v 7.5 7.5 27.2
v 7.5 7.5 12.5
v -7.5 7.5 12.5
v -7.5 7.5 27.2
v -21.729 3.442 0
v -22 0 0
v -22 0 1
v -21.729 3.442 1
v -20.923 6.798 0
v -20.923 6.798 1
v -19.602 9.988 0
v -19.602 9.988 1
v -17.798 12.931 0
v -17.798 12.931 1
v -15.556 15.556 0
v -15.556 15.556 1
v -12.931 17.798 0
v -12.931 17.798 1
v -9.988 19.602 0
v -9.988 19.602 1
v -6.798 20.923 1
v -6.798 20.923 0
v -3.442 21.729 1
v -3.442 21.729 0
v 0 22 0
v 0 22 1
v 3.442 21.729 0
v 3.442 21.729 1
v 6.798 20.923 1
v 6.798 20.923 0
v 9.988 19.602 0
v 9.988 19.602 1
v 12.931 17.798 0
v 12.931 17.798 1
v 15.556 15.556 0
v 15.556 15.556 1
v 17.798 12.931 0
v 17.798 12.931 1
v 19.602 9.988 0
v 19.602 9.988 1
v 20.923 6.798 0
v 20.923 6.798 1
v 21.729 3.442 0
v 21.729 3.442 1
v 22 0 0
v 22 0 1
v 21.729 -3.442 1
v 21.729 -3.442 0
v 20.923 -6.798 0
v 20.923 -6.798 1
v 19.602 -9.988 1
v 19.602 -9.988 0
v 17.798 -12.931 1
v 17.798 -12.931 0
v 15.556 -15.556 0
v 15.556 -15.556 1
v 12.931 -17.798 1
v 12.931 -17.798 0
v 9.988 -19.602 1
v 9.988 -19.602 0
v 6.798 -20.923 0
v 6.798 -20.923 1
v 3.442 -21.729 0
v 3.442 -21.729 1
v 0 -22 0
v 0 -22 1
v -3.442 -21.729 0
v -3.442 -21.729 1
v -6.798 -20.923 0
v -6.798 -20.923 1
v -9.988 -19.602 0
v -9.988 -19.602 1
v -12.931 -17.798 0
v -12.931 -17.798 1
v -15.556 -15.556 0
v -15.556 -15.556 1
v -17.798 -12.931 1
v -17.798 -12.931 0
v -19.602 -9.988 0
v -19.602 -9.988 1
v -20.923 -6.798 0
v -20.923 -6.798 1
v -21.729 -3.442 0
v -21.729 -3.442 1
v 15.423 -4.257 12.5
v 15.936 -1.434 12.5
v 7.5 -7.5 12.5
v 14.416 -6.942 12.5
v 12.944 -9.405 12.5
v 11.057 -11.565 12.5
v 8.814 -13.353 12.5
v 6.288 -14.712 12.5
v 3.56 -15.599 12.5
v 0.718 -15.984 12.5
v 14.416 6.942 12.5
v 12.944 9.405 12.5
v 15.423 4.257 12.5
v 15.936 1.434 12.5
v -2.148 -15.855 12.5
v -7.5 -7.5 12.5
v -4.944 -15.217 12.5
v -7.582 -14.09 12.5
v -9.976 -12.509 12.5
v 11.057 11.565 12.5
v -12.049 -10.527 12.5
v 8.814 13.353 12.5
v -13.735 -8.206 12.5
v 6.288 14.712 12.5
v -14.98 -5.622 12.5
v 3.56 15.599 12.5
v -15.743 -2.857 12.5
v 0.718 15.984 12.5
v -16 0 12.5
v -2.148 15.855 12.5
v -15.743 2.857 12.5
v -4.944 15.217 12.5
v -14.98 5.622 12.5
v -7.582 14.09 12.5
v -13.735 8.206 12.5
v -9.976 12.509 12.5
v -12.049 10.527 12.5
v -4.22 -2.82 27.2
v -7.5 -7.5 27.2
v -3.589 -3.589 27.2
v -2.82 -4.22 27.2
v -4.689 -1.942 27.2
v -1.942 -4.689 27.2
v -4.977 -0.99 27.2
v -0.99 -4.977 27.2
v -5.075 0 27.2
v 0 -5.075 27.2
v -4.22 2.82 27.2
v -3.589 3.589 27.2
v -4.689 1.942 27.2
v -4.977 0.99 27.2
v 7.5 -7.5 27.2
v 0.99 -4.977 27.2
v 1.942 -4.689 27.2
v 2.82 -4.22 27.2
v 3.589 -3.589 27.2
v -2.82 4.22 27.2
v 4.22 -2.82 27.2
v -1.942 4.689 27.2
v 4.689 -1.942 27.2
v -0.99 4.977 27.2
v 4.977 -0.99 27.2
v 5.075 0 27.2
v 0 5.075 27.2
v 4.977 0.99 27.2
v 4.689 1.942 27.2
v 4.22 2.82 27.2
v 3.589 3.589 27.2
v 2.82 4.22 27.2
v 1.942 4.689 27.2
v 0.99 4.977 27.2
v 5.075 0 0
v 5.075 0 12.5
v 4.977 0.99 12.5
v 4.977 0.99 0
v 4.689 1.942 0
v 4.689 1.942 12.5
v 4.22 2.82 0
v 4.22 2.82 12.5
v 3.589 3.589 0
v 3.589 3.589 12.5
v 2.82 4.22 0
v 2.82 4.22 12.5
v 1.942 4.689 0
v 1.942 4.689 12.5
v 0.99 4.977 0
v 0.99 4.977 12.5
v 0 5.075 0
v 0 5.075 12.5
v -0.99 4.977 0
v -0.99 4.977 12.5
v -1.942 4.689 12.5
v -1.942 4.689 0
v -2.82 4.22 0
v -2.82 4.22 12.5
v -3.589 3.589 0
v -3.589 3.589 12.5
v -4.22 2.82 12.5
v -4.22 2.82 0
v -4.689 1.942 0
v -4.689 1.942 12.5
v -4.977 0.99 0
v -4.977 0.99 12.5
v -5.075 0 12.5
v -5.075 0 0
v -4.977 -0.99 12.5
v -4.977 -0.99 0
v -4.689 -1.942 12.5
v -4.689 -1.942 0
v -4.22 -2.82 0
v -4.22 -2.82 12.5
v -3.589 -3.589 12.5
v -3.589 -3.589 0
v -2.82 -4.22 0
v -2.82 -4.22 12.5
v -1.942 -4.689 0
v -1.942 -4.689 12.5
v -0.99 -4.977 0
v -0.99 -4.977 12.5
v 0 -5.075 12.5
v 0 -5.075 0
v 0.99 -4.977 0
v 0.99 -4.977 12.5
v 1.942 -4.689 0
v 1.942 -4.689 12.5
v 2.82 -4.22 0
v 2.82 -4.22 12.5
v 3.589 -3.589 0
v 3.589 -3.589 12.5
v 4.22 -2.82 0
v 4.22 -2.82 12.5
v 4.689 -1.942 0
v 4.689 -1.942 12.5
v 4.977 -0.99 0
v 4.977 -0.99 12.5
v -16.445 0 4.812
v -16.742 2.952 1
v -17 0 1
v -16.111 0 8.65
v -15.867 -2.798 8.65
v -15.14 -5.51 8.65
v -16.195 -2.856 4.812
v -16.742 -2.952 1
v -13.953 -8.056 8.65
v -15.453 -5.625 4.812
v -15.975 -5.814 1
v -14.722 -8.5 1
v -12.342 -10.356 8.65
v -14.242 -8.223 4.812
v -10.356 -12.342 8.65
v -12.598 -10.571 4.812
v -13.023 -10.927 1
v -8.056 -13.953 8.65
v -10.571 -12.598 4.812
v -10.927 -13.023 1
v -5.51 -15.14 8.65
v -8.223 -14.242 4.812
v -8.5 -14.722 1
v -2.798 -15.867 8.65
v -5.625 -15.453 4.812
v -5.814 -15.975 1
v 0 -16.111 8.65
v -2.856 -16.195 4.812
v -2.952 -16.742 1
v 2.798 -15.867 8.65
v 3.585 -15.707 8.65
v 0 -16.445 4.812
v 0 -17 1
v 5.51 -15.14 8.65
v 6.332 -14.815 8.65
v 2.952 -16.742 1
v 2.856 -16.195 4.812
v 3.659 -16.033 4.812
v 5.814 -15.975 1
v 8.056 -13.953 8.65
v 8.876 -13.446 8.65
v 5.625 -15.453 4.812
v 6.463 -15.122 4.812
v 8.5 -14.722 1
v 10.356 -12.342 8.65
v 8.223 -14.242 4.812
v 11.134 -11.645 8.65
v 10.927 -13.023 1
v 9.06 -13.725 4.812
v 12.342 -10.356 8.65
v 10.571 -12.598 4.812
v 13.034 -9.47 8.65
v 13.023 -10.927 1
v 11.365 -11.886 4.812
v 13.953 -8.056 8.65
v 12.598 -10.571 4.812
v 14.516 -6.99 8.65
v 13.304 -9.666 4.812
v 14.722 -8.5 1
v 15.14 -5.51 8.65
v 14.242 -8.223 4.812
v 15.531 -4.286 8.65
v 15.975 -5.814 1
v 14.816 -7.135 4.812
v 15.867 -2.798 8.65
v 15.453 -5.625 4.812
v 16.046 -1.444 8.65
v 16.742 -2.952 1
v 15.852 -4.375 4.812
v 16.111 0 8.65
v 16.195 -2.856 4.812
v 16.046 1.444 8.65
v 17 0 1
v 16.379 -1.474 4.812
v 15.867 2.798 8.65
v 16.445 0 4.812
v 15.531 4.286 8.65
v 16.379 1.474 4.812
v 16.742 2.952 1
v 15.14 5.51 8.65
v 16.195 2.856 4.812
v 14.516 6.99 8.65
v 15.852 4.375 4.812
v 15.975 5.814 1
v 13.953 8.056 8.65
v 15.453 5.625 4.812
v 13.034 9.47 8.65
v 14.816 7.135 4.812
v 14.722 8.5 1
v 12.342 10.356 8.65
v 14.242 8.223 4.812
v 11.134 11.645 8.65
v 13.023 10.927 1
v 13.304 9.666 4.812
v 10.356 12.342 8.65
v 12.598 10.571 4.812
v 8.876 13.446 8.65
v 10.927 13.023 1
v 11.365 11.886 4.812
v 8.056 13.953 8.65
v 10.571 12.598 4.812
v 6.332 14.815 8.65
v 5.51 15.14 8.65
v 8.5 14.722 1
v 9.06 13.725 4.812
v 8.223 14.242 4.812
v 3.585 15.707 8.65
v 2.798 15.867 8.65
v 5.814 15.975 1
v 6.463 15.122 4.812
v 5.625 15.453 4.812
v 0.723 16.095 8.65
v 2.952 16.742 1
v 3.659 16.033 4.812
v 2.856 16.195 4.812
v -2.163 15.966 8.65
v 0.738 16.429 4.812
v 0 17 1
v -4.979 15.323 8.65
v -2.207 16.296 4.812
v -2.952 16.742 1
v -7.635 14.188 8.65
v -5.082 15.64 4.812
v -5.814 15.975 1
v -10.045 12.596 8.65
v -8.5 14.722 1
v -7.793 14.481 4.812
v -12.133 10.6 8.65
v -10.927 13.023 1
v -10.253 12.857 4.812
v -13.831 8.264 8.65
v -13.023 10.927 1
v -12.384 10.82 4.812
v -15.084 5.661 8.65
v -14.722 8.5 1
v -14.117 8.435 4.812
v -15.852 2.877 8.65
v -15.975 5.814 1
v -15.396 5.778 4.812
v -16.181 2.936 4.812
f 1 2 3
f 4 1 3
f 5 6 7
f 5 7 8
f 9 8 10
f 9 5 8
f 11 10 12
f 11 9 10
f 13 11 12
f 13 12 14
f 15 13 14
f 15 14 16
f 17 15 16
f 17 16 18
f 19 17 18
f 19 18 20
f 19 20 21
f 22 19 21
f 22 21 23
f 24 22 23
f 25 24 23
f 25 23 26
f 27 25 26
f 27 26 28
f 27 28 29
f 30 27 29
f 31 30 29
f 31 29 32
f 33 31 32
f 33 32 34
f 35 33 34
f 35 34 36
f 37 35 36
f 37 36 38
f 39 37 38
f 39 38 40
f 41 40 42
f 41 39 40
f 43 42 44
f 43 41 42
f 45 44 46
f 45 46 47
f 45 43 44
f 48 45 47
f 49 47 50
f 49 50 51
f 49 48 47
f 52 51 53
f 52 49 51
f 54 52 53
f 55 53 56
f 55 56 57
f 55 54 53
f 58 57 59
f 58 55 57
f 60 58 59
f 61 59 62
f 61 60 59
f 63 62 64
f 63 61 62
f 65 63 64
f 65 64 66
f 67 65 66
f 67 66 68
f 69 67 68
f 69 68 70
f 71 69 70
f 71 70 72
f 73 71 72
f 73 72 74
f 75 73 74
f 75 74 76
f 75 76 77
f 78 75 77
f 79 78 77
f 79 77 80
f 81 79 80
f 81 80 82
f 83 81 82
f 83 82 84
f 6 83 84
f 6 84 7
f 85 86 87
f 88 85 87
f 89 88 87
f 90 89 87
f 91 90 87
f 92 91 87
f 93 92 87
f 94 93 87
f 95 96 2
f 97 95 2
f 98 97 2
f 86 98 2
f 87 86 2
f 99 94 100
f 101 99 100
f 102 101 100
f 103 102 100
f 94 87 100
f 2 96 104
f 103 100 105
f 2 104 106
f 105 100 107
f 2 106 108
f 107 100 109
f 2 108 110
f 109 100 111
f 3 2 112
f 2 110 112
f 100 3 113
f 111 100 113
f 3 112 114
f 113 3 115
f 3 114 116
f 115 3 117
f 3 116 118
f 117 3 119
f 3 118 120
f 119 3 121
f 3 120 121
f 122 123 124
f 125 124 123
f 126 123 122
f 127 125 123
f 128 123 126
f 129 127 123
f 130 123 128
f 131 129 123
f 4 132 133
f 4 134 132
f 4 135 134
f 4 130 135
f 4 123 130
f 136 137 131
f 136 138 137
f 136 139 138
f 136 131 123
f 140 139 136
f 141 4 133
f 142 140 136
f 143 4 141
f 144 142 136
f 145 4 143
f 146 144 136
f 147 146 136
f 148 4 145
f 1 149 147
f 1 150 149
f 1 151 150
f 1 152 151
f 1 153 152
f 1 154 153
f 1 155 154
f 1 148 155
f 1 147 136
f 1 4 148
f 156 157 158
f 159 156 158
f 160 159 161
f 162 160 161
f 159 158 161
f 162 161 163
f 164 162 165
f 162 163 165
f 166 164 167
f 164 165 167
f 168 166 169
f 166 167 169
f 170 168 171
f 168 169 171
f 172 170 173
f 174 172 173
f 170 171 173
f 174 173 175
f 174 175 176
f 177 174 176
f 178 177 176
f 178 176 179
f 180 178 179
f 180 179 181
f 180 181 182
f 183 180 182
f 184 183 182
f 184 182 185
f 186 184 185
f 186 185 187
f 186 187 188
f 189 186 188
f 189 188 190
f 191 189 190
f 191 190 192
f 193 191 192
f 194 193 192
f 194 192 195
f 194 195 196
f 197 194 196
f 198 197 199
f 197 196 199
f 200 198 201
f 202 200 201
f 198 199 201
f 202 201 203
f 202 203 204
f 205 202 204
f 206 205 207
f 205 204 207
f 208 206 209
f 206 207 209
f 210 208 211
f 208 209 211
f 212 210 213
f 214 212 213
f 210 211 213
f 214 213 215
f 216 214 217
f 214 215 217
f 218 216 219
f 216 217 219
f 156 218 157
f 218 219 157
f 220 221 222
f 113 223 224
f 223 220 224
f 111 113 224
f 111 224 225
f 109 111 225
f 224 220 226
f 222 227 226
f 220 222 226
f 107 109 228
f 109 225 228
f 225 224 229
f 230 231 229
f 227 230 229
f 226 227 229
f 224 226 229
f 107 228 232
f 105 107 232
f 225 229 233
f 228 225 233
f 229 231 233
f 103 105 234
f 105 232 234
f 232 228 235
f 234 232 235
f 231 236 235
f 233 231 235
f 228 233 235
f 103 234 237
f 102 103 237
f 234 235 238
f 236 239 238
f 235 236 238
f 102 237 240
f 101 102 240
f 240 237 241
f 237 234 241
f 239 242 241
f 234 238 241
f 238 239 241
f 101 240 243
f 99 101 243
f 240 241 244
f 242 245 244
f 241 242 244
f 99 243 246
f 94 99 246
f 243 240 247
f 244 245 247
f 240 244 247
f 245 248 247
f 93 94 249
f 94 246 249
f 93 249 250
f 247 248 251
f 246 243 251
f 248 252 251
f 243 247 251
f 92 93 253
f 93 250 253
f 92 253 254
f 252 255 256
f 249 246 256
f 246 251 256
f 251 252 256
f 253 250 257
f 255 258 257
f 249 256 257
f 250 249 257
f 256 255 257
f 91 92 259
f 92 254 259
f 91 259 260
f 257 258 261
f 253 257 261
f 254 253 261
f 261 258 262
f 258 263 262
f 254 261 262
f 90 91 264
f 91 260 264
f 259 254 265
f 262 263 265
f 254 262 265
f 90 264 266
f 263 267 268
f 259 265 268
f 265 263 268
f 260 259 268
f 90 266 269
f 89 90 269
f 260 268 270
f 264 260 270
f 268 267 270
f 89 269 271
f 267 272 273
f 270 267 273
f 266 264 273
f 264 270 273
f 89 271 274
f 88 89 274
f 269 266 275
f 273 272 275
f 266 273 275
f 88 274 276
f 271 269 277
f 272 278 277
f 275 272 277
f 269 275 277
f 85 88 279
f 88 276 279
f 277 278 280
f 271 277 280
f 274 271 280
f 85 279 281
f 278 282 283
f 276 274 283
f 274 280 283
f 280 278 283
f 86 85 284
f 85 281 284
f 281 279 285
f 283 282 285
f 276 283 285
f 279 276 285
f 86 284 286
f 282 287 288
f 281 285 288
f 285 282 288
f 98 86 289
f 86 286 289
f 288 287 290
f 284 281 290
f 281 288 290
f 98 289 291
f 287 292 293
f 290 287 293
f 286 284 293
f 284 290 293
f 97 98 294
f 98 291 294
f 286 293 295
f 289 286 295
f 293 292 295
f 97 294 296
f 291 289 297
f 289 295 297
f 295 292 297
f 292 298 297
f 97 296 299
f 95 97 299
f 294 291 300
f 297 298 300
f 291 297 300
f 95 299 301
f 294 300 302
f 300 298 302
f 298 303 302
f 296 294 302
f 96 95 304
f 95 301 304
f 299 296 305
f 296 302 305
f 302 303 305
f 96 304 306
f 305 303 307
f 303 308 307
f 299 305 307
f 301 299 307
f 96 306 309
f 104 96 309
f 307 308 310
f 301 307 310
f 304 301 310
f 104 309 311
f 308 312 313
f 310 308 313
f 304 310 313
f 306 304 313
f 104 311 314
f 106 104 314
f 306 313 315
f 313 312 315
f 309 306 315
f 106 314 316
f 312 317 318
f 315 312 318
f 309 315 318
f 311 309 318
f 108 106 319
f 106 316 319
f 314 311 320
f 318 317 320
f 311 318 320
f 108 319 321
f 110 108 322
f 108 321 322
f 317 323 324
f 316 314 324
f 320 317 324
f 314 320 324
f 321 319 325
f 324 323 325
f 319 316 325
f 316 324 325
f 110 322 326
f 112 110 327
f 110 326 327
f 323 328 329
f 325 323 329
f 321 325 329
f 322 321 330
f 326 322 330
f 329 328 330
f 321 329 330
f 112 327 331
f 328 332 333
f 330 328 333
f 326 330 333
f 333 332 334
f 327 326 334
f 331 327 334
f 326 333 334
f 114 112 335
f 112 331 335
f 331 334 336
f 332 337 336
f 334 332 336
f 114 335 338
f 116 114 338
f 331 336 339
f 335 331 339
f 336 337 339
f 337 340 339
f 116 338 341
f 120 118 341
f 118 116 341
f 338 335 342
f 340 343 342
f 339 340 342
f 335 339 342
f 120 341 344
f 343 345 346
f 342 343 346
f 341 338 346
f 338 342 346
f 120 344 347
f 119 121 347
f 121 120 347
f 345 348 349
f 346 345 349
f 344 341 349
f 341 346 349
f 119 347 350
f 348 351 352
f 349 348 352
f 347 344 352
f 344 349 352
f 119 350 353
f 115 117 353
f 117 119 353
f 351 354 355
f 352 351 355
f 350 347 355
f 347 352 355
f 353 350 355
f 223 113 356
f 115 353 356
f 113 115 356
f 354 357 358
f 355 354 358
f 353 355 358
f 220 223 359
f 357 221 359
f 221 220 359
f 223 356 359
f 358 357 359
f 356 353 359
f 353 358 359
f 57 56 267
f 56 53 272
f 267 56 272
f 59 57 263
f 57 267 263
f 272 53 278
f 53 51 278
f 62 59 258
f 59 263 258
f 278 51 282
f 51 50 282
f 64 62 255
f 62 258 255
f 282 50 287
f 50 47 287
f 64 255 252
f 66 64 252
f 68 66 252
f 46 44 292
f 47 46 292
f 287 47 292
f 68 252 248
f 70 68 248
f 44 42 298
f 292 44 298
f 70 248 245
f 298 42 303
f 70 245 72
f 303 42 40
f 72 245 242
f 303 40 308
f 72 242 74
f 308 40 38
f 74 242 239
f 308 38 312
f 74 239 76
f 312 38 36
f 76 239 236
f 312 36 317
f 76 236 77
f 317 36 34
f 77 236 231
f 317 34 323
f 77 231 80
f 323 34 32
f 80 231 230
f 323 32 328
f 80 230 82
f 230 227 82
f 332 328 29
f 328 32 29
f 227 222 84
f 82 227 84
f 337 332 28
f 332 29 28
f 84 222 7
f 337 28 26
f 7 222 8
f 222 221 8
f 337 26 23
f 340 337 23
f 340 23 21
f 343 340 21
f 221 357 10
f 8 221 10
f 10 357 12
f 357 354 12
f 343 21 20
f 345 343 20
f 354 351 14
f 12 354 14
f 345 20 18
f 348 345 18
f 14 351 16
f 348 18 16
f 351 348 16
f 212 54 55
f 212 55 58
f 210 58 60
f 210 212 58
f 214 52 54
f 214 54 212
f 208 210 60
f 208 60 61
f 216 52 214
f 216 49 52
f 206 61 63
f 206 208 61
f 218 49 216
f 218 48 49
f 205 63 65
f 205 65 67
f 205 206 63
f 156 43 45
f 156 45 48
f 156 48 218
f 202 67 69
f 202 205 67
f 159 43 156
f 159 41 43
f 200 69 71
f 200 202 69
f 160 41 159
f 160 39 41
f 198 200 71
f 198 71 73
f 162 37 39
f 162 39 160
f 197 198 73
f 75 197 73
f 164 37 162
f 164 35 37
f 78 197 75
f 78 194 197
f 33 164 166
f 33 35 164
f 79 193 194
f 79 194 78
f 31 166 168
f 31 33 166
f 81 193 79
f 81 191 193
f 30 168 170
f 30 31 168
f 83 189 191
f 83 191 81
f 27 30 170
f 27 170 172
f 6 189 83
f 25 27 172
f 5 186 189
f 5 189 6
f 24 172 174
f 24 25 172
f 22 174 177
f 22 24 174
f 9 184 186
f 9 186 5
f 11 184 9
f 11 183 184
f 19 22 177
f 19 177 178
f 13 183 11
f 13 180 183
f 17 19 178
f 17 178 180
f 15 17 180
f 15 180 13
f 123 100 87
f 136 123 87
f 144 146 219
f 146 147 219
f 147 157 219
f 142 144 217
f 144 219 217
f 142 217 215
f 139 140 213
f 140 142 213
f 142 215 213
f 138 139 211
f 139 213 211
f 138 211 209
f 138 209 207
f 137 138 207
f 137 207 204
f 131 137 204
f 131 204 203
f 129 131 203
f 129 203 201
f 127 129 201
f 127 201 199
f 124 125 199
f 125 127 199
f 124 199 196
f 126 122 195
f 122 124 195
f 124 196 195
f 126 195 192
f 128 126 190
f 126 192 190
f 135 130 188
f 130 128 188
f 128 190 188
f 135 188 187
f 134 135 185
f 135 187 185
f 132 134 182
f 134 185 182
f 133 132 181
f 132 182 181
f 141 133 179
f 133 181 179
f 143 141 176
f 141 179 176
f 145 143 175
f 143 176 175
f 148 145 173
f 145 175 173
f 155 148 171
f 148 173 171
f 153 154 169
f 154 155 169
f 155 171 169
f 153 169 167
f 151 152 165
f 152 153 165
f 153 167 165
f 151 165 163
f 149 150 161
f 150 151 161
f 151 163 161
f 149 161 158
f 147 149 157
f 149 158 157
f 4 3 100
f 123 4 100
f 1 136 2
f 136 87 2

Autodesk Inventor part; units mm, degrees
ref_plane "YZ Plane" through (0, 0, 0) normal (1, 0, 0) x (0, 1, 0)
ref_plane "XZ Plane" through (0, 0, 0) normal (0, 1, 0) x (-1, 0, 0)
ref_plane "XY Plane" through (0, 0, 0) normal (0, 0, 1) x (1, 0, 0)
sketch "Skizze1" plane through (0, 0, 0) normal (0, 1, 0) x (-1, 0, 0)
  line L0 (17, 1) -> (22, 1)
  line L1 (22, 1) -> (22, 0)
  line L2 (22, 0) -> (0, 0)
  line L3 (0, 12.5) -> (0, 0)
  line L4 (99.15, 0) -> (-16.525, 0) projected
  line L5 (0, -2.5) -> (0, 15) projected
  line L6 (16, 12.5) -> (0, 12.5)
  arc A0 (16, 12.5) -> (17, 1) centre (82.625, 12.5) ccw
  line L7 (16, 12.5) -> (16, 0) construction
  dimension "d5" = 44
  dimension "d6" = 12.5
  dimension "d7" = 1
  dimension "d15" = 16
  dimension "d16" = 17
revolve "Umdrehung1" add sketch "Skizze1" angle 360 about axis through (0, 0, 12.5) along (0, 0, -1)
sketch "Skizze3" plane through (0, 0, 12.5) normal (0, 0, 1) x (1, 0, 0)
  circle A0 centre (0, 0) radius 22 projected
  circle A1 centre (0, 0) radius 5.075
  dimension "d8" = 10.15
extrude "Extrusion2" cut sketch "Skizze3" against normal through all contours A1
sketch "Skizze4" plane through (0, 0, 12.5) normal (0, 0, 1) x (1, 0, 0)
  circle A0 centre (0, 0) radius 5.075 projected
  circle A1 centre (0, 0) radius 16 projected
  line L0 (-7.5, -7.5) -> (7.5, -7.5)
  line L1 (7.5, -7.5) -> (7.5, 7.5)
  line L2 (7.5, 7.5) -> (-7.5, 7.5)
  line L3 (-7.5, 7.5) -> (-7.5, -7.5)
  line L4 (-7.5, -7.5) -> (7.5, 7.5) construction
  line L5 (7.5, -7.5) -> (-7.5, 7.5) construction
  dimension "d11" = 15
  dimension "d12" = 15
extrude "Extrusion3" add sketch "Skizze4" along normal blind 14.7 contours L3 L2 L1 L0
properties part number "Seil_Rolle_Antrieb_Links" material "PC/ABS-Kunststoff"
